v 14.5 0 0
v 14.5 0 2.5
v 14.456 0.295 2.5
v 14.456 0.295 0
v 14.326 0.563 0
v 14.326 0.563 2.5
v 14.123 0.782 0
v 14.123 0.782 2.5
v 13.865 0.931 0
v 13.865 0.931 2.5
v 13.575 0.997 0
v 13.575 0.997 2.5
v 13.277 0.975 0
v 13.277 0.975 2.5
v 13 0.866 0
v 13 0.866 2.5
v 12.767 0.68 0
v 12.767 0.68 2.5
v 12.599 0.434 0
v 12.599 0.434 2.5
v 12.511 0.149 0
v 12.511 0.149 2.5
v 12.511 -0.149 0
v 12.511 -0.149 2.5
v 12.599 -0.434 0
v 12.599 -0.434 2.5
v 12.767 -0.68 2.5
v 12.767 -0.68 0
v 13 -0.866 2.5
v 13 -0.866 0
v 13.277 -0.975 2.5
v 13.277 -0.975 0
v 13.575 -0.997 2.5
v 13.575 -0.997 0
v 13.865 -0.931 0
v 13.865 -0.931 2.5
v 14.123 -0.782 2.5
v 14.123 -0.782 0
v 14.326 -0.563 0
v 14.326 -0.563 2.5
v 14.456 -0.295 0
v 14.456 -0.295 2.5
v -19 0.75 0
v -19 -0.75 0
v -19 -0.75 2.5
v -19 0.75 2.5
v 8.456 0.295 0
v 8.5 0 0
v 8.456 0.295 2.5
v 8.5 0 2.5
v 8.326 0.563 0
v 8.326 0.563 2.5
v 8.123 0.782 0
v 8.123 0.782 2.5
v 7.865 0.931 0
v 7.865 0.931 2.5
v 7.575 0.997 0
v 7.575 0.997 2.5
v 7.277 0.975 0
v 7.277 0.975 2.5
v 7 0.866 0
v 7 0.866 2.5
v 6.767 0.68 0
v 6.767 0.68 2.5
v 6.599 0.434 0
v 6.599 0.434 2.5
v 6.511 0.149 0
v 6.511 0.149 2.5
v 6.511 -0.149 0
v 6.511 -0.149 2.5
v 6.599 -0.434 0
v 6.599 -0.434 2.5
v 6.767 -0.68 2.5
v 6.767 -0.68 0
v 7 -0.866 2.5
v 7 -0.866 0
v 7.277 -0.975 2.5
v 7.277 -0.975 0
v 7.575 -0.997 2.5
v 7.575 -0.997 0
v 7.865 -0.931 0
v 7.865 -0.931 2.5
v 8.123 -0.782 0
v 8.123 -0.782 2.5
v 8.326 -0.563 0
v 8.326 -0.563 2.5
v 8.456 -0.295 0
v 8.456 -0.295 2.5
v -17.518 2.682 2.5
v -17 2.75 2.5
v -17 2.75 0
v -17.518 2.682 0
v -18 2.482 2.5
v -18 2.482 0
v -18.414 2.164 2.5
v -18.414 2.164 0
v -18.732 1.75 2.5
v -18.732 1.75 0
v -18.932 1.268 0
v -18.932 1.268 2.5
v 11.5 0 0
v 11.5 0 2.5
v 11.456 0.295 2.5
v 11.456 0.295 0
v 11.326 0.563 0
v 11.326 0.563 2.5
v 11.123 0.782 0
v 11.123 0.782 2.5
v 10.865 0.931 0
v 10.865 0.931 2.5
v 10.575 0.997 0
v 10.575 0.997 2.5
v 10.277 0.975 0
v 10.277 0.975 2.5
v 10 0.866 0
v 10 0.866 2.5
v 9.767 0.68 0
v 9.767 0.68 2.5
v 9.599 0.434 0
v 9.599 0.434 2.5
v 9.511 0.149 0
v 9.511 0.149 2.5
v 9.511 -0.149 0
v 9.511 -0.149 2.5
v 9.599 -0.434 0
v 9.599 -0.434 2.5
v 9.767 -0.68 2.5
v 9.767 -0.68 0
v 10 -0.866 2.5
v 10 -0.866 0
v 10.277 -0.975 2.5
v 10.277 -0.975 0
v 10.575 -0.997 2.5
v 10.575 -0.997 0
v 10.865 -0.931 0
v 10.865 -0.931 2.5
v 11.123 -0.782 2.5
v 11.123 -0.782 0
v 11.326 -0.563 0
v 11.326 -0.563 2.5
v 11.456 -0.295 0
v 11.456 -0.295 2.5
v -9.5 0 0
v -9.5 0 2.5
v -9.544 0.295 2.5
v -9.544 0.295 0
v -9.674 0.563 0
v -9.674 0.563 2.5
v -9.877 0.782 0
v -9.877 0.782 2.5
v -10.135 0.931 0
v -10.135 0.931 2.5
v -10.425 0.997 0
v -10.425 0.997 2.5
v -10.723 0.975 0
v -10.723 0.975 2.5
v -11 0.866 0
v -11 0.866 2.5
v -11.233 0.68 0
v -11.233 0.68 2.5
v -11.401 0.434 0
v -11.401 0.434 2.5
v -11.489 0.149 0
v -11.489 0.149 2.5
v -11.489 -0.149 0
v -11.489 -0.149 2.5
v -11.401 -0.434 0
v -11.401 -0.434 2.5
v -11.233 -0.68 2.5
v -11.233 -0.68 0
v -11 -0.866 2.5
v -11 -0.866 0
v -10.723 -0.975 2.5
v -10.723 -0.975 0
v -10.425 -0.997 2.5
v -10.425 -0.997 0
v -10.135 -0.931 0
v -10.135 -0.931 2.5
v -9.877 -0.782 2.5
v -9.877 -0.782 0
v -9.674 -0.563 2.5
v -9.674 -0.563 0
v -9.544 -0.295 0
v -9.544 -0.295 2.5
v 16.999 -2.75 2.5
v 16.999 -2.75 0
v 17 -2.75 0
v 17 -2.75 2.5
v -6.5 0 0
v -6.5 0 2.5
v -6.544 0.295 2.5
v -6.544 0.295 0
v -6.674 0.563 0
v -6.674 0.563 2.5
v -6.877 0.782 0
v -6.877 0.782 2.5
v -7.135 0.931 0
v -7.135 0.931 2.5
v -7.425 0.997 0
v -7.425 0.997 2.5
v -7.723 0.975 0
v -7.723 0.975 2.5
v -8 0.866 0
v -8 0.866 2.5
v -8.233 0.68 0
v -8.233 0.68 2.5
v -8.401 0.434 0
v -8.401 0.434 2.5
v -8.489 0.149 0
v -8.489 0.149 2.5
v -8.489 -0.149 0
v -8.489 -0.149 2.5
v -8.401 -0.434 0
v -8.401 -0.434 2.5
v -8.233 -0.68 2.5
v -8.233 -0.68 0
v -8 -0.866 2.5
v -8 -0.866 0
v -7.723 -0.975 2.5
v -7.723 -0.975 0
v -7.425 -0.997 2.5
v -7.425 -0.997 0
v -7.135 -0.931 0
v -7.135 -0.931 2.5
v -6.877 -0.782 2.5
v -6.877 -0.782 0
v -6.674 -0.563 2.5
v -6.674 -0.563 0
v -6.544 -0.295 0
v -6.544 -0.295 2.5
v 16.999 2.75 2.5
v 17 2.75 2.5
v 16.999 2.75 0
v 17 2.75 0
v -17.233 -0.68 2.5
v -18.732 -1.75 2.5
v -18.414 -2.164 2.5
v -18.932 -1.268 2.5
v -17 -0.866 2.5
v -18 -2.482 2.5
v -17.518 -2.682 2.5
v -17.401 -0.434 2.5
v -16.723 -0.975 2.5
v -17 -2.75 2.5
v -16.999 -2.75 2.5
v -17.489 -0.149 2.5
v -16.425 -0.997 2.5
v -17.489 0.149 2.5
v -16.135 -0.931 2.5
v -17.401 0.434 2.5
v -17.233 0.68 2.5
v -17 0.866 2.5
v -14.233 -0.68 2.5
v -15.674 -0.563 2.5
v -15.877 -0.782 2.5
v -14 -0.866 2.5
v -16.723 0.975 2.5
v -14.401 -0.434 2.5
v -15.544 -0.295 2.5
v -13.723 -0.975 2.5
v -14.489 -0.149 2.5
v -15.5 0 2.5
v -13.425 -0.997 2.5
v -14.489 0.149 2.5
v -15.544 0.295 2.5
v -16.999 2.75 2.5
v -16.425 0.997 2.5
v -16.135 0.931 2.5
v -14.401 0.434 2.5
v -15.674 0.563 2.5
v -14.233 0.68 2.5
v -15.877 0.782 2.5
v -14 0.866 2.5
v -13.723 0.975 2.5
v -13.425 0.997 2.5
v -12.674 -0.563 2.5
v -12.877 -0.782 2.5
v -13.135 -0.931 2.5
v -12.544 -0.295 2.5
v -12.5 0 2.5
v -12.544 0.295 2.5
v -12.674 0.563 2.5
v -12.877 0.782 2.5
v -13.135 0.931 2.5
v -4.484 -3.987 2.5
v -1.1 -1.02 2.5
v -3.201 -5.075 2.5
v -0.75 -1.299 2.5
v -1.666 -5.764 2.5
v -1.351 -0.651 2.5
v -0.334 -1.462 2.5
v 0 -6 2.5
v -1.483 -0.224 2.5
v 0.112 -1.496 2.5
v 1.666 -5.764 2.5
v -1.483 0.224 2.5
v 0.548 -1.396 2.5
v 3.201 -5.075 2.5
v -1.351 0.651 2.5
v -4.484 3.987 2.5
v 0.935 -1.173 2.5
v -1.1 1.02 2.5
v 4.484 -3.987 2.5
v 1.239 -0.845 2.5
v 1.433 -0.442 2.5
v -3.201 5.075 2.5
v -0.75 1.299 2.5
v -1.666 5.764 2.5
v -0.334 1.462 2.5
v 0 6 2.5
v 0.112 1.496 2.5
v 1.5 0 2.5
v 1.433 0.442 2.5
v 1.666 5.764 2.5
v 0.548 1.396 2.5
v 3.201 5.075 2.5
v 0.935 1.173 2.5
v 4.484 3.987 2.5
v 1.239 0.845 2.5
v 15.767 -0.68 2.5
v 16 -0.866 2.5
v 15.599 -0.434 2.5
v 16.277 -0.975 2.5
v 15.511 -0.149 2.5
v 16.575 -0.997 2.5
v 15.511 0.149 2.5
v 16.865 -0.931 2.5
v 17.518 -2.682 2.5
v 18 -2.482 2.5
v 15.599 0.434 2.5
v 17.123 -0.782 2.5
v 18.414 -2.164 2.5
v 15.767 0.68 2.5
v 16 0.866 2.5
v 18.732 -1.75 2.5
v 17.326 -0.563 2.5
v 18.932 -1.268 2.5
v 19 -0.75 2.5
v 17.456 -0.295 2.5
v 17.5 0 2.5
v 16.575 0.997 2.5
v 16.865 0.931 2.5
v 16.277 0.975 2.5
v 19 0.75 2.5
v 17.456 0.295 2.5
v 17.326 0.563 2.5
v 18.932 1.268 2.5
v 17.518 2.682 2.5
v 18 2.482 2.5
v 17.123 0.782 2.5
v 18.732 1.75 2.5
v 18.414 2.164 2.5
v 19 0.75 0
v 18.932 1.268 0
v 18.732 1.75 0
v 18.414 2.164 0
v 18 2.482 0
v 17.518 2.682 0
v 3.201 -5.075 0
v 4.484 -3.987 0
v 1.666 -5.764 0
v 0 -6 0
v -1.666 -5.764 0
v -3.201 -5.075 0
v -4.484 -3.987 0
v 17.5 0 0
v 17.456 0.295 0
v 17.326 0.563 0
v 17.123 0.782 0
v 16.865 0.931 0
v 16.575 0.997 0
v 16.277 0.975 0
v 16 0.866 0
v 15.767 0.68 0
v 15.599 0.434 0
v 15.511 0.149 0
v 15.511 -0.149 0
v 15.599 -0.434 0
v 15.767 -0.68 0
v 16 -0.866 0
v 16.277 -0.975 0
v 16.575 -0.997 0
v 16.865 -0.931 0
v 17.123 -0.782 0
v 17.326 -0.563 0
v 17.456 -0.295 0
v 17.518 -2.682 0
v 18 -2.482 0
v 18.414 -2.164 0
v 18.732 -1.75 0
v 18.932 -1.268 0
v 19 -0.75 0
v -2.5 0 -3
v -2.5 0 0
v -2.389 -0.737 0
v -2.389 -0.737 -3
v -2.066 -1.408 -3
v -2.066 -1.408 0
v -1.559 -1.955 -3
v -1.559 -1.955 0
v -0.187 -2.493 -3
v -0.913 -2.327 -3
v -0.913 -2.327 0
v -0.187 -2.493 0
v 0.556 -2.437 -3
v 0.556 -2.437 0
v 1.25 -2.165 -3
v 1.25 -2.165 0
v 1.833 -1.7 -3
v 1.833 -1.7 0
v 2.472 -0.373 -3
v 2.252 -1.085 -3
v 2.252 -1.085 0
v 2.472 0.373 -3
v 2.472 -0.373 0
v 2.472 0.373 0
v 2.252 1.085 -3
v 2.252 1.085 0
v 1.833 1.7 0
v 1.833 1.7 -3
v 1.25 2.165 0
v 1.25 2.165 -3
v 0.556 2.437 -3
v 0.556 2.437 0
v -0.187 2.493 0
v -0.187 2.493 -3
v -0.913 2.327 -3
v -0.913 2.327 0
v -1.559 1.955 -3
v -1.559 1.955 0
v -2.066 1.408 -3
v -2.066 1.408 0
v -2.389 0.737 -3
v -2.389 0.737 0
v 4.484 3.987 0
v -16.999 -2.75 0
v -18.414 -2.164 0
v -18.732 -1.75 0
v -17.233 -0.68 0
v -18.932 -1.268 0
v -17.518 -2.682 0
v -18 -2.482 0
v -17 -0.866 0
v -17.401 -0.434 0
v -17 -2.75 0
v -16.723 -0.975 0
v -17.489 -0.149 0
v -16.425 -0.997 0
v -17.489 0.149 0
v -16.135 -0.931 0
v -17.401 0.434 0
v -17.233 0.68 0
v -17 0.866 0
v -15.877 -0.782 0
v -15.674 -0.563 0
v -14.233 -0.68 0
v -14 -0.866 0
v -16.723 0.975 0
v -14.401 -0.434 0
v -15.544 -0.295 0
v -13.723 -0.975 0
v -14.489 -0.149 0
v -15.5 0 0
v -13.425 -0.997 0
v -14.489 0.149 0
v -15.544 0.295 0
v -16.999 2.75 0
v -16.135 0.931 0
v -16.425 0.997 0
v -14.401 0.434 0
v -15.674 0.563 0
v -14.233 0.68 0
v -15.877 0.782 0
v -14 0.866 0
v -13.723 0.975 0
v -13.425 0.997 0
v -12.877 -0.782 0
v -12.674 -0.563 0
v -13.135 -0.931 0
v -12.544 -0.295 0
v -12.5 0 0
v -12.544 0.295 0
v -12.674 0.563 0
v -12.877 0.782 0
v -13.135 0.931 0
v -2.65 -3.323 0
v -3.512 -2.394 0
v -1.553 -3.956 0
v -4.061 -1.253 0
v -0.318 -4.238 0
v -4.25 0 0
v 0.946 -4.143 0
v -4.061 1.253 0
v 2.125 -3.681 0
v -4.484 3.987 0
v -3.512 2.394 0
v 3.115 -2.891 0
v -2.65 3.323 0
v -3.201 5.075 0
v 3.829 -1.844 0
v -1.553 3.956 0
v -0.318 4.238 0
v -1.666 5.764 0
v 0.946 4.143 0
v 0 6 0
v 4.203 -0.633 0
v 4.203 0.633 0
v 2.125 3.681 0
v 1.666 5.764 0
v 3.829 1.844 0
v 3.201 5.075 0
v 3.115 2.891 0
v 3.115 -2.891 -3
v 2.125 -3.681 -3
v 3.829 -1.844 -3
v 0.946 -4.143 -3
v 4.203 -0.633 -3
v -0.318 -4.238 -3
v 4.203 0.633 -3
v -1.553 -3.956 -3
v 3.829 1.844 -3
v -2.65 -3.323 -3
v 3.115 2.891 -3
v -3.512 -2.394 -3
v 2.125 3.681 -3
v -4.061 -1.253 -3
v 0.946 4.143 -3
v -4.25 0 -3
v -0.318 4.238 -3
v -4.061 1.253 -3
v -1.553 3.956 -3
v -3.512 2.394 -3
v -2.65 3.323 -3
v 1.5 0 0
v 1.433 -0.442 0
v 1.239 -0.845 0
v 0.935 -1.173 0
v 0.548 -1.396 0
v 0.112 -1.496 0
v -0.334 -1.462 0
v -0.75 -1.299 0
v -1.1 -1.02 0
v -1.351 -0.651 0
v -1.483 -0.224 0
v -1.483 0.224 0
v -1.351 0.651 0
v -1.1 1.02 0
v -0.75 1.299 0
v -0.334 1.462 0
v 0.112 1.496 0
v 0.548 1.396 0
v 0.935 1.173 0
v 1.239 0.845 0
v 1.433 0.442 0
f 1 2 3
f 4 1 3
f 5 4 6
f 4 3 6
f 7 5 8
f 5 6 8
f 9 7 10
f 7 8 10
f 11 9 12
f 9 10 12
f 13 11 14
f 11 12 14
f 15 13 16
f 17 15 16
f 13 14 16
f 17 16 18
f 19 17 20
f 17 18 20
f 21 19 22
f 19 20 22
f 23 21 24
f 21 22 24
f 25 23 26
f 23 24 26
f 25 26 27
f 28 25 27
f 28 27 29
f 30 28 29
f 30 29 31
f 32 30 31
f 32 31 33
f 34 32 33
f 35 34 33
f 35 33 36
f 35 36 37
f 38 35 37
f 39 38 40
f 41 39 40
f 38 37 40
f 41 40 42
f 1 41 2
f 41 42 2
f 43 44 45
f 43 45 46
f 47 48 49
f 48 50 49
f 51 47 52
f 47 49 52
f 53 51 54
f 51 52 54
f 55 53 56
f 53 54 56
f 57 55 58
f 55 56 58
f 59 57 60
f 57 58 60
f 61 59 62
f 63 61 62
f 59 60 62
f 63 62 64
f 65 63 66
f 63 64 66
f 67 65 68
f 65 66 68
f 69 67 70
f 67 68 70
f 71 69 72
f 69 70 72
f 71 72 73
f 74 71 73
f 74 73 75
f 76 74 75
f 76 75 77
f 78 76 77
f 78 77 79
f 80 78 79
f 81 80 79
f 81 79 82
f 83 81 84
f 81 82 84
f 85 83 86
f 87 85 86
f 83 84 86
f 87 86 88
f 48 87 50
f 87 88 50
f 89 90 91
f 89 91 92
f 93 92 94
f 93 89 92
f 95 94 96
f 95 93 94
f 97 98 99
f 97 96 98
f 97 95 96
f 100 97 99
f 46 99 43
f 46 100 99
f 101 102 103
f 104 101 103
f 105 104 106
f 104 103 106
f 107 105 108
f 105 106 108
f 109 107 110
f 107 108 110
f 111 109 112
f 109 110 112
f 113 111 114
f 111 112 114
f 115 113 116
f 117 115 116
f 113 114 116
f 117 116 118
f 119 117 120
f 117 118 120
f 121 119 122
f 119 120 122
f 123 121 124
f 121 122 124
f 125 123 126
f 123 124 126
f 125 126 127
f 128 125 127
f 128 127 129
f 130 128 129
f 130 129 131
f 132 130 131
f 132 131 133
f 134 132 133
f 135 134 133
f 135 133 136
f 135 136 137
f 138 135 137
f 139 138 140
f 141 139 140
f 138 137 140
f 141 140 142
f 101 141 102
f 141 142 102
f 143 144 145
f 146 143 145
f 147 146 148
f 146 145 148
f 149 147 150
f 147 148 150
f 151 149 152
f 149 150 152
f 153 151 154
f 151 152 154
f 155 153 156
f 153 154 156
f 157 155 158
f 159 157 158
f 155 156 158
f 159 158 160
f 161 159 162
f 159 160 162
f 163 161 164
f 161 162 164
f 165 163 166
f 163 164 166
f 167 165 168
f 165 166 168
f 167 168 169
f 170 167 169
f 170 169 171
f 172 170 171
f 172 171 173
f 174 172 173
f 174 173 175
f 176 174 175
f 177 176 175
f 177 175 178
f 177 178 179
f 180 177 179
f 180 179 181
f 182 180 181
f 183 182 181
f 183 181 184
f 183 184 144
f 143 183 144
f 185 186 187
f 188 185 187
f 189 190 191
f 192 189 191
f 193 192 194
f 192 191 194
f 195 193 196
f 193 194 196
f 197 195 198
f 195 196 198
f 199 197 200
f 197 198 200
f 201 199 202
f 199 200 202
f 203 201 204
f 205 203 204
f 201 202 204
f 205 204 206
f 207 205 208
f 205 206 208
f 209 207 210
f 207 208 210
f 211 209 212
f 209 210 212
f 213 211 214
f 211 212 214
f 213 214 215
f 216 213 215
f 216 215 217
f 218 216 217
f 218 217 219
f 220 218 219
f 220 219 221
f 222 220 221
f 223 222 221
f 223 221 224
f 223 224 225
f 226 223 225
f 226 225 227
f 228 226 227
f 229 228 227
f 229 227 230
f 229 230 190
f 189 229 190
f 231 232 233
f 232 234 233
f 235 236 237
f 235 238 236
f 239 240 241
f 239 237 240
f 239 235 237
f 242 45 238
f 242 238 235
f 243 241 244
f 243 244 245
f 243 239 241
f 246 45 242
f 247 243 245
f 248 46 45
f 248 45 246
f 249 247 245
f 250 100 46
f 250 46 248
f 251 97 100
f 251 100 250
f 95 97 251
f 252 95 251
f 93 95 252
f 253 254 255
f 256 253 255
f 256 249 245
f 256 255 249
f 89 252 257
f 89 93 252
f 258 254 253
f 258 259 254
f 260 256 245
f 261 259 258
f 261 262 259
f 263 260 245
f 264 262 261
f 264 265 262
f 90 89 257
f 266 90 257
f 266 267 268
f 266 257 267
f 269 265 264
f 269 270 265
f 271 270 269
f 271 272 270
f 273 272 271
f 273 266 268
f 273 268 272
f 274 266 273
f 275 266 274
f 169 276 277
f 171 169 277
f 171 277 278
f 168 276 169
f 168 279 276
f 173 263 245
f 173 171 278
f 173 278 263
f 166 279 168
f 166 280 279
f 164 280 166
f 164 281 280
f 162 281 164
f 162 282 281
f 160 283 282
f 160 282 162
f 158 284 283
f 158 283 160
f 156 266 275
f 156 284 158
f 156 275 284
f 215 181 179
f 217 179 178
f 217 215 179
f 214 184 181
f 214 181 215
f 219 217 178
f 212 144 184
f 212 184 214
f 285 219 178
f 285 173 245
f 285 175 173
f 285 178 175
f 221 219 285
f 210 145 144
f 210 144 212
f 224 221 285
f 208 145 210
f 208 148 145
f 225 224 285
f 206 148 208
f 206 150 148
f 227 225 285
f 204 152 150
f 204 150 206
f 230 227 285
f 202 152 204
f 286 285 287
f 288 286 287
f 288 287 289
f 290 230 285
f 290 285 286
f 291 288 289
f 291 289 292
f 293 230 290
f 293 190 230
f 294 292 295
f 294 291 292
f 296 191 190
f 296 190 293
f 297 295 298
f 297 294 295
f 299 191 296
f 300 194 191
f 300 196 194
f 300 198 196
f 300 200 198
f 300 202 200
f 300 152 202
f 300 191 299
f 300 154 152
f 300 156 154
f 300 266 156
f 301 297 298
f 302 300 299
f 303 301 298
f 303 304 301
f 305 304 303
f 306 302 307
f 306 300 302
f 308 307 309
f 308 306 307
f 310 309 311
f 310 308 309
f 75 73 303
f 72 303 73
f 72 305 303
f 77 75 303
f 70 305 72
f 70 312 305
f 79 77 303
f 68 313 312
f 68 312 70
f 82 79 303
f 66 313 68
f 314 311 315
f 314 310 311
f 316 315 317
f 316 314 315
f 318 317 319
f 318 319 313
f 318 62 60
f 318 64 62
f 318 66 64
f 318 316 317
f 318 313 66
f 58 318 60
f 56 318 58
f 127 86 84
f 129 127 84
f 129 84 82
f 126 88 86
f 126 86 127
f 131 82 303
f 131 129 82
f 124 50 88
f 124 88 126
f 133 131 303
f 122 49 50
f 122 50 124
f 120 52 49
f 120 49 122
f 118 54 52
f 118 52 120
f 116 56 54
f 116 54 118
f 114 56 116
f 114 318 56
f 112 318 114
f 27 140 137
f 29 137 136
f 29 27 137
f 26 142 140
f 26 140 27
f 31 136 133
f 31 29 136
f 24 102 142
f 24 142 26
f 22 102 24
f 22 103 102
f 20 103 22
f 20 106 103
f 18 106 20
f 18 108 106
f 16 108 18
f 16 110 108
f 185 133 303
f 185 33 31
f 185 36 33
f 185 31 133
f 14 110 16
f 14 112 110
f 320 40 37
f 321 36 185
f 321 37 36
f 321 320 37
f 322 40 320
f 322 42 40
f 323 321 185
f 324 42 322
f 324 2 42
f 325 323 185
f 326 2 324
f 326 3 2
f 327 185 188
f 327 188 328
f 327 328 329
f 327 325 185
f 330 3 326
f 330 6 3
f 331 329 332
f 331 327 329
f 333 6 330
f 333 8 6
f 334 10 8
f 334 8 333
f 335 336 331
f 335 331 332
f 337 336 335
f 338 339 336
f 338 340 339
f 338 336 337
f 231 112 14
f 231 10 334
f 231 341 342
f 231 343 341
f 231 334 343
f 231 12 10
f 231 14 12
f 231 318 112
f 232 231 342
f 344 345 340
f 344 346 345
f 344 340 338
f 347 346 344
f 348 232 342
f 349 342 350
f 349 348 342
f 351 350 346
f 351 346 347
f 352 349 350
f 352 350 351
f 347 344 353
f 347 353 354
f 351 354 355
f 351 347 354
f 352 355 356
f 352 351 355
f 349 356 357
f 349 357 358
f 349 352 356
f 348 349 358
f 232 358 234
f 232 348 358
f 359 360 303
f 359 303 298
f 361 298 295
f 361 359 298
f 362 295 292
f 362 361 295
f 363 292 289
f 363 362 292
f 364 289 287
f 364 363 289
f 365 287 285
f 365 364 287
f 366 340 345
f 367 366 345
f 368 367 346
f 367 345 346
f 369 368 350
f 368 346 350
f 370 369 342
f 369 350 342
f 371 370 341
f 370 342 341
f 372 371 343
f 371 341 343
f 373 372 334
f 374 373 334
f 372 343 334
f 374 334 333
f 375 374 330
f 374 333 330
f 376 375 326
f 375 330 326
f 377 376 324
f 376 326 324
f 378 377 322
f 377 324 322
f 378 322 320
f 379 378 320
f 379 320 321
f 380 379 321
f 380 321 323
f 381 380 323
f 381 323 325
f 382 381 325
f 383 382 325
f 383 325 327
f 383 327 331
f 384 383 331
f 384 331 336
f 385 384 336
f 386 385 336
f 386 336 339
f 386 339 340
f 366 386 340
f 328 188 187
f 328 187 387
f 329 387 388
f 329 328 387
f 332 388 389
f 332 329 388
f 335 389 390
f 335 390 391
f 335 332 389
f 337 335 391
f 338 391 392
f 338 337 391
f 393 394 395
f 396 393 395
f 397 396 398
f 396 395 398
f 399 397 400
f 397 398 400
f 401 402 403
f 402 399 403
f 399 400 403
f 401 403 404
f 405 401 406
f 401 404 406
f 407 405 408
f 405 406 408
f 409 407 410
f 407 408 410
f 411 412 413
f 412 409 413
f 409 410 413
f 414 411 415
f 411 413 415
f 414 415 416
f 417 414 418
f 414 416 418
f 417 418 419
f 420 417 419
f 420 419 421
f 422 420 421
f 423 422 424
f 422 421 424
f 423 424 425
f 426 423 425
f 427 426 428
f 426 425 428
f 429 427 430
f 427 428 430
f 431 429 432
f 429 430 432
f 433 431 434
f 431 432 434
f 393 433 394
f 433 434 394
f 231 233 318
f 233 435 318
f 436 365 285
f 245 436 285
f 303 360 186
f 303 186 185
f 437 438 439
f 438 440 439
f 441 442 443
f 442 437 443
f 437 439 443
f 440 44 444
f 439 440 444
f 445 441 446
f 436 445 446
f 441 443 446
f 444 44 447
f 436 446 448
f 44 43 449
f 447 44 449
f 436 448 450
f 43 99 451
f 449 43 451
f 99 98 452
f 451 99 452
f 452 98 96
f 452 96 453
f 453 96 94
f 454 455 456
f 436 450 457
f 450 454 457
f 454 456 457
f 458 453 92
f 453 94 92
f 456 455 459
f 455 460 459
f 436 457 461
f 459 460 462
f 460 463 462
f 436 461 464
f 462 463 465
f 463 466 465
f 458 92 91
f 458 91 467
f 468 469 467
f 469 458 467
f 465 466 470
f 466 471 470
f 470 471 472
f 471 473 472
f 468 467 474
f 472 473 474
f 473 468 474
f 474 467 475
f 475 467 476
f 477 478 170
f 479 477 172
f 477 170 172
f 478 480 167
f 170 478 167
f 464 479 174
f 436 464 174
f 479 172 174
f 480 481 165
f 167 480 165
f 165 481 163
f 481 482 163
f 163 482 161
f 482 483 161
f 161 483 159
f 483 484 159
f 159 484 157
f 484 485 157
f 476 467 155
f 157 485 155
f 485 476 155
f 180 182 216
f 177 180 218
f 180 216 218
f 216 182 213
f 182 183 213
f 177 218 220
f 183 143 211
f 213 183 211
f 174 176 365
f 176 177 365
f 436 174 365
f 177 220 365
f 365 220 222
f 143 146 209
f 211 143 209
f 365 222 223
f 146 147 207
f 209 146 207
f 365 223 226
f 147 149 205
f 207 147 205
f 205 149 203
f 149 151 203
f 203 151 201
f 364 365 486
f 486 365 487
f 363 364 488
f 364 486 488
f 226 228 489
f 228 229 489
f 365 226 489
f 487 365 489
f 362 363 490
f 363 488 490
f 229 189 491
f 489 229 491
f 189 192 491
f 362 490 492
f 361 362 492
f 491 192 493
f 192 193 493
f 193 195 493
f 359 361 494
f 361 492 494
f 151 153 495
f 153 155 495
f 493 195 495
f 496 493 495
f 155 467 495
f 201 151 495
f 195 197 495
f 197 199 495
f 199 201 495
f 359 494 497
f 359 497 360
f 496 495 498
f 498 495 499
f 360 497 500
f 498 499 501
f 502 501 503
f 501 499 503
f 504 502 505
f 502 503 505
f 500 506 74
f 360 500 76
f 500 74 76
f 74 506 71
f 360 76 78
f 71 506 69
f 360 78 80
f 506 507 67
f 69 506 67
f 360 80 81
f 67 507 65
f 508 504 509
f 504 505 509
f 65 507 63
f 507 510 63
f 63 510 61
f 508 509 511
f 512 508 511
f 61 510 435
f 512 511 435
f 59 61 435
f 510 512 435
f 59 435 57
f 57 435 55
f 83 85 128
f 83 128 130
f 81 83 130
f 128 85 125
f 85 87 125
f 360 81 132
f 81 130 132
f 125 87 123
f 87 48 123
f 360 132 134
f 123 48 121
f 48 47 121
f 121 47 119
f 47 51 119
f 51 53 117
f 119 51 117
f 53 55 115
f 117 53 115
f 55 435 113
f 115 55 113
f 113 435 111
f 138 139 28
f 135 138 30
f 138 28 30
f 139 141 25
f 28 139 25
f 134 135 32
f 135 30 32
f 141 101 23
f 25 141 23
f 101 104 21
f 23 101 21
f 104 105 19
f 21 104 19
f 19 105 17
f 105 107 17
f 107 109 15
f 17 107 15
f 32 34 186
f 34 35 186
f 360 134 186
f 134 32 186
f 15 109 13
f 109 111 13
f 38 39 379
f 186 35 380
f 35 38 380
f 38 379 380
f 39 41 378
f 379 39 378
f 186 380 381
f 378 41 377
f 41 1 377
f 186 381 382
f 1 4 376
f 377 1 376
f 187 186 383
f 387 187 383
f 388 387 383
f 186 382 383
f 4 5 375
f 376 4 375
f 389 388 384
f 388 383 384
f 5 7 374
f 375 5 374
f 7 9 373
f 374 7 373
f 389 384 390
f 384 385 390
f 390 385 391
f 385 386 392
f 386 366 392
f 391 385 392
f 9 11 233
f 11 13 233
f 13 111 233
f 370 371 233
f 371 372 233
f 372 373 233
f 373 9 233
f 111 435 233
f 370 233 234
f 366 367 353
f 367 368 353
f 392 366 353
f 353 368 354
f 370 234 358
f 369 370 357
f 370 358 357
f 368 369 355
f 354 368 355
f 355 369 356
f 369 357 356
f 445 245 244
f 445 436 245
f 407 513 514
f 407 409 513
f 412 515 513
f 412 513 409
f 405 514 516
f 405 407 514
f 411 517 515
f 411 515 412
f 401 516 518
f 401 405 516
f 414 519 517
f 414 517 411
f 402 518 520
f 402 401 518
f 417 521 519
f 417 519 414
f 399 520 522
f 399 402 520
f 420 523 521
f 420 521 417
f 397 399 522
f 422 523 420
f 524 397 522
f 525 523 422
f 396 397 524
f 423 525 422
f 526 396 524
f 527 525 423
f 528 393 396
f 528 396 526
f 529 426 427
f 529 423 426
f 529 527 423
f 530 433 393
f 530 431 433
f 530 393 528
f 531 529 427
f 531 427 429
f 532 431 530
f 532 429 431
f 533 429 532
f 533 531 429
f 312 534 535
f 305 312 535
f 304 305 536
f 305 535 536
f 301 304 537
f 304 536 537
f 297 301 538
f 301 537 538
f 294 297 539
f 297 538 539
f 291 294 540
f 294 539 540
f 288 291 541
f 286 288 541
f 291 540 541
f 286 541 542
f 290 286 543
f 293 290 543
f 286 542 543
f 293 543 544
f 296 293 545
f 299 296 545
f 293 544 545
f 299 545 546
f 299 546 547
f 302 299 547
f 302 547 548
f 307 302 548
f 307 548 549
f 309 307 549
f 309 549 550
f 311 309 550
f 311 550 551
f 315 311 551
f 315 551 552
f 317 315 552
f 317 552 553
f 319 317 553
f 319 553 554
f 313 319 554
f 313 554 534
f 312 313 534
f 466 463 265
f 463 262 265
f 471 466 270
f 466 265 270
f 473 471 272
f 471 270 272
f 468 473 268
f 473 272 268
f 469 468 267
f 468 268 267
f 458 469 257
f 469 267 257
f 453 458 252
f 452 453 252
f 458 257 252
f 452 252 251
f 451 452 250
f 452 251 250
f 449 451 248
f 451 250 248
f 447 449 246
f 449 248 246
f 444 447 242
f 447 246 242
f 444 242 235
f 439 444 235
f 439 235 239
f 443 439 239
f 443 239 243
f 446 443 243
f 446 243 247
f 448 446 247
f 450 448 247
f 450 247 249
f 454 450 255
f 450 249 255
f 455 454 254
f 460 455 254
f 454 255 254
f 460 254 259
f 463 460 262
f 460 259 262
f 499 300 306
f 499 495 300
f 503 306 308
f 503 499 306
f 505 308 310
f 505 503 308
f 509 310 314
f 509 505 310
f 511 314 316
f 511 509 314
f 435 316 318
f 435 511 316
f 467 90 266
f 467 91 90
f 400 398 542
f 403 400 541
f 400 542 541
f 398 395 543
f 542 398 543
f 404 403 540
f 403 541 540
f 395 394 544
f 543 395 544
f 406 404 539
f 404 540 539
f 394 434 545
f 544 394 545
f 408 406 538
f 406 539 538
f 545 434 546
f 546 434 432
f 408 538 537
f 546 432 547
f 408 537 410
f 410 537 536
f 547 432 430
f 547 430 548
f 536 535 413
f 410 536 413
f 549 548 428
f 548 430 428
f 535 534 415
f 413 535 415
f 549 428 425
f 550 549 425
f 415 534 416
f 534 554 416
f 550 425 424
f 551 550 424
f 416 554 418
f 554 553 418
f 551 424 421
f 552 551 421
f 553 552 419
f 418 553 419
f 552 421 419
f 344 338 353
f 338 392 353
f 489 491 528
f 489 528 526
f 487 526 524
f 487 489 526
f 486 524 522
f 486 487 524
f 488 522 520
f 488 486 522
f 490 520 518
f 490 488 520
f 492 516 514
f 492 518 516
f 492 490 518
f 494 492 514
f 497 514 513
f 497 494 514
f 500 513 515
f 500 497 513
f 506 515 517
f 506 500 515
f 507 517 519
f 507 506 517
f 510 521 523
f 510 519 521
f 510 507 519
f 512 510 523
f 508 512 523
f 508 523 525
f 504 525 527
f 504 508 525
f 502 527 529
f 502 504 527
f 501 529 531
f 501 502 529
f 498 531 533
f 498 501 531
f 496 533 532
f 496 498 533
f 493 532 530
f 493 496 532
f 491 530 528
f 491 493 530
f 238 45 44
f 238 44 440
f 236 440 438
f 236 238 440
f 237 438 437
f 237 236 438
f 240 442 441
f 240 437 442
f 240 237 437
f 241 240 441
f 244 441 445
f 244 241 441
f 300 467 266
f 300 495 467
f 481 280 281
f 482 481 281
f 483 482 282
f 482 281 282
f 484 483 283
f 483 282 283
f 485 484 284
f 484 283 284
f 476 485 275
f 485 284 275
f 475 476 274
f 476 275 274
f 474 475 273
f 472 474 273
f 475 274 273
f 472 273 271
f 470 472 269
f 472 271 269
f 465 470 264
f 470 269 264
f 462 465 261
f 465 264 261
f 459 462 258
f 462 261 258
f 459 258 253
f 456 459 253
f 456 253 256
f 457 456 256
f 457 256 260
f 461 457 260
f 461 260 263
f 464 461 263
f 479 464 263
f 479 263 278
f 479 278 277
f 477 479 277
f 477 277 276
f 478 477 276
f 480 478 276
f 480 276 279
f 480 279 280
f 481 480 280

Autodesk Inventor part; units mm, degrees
ref_plane "YZ Plane" through (0, 0, 0) normal (1, 0, 0) x (0, 1, 0)
ref_plane "XZ Plane" through (0, 0, 0) normal (0, 1, 0) x (-1, 0, 0)
ref_plane "XY Plane" through (0, 0, 0) normal (0, 0, 1) x (1, 0, 0)
sketch "Sketch1" plane through (0, 0, 0) normal (0, 0, 1) x (1, 0, 0)
  circle A0 centre (0, 0) radius 1.5
  circle A1 centre (0, 0) radius 6
  line L0 (-19, 2.75) -> (-1.5, 2.75)
  line L1 (-1.5, 2.75) -> (-1.5, -2.75)
  line L2 (-1.5, -2.75) -> (-19, -2.75)
  line L3 (-19, -2.75) -> (-19, 2.75)
  line L4 (0, -8.4) -> (0, 8.4) construction
  line L5 (19, 2.75) -> (1.5, 2.75)
  line L6 (1.5, 2.75) -> (1.5, -2.75)
  line L7 (1.5, -2.75) -> (19, -2.75)
  line L8 (19, -2.75) -> (19, 2.75)
  point P0 (-1.5, 0)
  dimension "d0" = 3
  dimension "d1" = 12
  dimension "d2" = 17.5
  dimension "d3" = 5.5
extrude "Extrusion1" add sketch "Sketch1" along normal blind 2.5 contours L6 L7 A1 L2 L1 A0 | A0 L1 L0 A1 L5 L6 | L6 L5 A1 L7 | L1 L2 A1 L0 | L5 L8 L7 A1 | A1 L2 L3 L0
fillet "Fillet1" radius 2 4 edges at (-19, 2.75, 1.25) (-19, -2.75, 1.25) (19, 2.75, 1.25) (19, -2.75, 1.25)
chamfer "Chamfer6" distance 11.6666 distance2 1.5 1 edges at (-5.3327, 2.75, 1.25) measured on face at (-13.1109, 2.75, 0.8333)
chamfer "Chamfer7" distance 11.6666 distance2 1.5 1 edges at (5.3327, 2.75, 1.25) measured on face at (13.1109, 2.75, 0.8333)
chamfer "Chamfer8" distance 11.6666 distance2 1.5 1 edges at (-5.3327, -2.75, 1.25) measured on face at (-9.2218, -2.75, 1.6667)
chamfer "Chamfer9" distance 11.6666 distance2 1.5 1 edges at (5.3327, -2.75, 1.25) measured on face at (9.2218, -2.75, 0.8333)
sketch "Sketch3" plane through (0, 0, 2.5) normal (0, 0, 1) x (1, 0, 0)
  circle A0 centre (-7.5, 0) radius 1
  line L0 (-26.6, 0) -> (26.6, 0) construction
  circle A1 centre (-10.5, 0) radius 1
  circle A2 centre (-13.5, 0) radius 1
  circle A3 centre (-16.5, 0) radius 1
  line L1 (0, -8.4) -> (0, 8.4) construction
  circle A4 centre (7.5, 0) radius 1
  circle A5 centre (10.5, 0) radius 1
  circle A6 centre (13.5, 0) radius 1
  circle A7 centre (16.5, 0) radius 1
  point P0 (0, 0)
  dimension "d37" = 2
  dimension "d38" = 7.5
  dimension "d41" = 3
extrude "Extrusion3" cut sketch "Sketch3" against normal through all
sketch "Sketch4" plane through (0, 0, 0) normal (0, 0, -1) x (-1, 0, 0)
  circle A0 centre (0, 0) radius 1.5 projected
  circle A1 centre (0, 0) radius 2.5
  circle A2 centre (0, 0) radius 4.25
  dimension "d48" = 5
  dimension "d49" = 8.5
extrude "Extrusion4" add sketch "Sketch4" along normal blind 3 contours A2
properties part number "ServoArm2"
